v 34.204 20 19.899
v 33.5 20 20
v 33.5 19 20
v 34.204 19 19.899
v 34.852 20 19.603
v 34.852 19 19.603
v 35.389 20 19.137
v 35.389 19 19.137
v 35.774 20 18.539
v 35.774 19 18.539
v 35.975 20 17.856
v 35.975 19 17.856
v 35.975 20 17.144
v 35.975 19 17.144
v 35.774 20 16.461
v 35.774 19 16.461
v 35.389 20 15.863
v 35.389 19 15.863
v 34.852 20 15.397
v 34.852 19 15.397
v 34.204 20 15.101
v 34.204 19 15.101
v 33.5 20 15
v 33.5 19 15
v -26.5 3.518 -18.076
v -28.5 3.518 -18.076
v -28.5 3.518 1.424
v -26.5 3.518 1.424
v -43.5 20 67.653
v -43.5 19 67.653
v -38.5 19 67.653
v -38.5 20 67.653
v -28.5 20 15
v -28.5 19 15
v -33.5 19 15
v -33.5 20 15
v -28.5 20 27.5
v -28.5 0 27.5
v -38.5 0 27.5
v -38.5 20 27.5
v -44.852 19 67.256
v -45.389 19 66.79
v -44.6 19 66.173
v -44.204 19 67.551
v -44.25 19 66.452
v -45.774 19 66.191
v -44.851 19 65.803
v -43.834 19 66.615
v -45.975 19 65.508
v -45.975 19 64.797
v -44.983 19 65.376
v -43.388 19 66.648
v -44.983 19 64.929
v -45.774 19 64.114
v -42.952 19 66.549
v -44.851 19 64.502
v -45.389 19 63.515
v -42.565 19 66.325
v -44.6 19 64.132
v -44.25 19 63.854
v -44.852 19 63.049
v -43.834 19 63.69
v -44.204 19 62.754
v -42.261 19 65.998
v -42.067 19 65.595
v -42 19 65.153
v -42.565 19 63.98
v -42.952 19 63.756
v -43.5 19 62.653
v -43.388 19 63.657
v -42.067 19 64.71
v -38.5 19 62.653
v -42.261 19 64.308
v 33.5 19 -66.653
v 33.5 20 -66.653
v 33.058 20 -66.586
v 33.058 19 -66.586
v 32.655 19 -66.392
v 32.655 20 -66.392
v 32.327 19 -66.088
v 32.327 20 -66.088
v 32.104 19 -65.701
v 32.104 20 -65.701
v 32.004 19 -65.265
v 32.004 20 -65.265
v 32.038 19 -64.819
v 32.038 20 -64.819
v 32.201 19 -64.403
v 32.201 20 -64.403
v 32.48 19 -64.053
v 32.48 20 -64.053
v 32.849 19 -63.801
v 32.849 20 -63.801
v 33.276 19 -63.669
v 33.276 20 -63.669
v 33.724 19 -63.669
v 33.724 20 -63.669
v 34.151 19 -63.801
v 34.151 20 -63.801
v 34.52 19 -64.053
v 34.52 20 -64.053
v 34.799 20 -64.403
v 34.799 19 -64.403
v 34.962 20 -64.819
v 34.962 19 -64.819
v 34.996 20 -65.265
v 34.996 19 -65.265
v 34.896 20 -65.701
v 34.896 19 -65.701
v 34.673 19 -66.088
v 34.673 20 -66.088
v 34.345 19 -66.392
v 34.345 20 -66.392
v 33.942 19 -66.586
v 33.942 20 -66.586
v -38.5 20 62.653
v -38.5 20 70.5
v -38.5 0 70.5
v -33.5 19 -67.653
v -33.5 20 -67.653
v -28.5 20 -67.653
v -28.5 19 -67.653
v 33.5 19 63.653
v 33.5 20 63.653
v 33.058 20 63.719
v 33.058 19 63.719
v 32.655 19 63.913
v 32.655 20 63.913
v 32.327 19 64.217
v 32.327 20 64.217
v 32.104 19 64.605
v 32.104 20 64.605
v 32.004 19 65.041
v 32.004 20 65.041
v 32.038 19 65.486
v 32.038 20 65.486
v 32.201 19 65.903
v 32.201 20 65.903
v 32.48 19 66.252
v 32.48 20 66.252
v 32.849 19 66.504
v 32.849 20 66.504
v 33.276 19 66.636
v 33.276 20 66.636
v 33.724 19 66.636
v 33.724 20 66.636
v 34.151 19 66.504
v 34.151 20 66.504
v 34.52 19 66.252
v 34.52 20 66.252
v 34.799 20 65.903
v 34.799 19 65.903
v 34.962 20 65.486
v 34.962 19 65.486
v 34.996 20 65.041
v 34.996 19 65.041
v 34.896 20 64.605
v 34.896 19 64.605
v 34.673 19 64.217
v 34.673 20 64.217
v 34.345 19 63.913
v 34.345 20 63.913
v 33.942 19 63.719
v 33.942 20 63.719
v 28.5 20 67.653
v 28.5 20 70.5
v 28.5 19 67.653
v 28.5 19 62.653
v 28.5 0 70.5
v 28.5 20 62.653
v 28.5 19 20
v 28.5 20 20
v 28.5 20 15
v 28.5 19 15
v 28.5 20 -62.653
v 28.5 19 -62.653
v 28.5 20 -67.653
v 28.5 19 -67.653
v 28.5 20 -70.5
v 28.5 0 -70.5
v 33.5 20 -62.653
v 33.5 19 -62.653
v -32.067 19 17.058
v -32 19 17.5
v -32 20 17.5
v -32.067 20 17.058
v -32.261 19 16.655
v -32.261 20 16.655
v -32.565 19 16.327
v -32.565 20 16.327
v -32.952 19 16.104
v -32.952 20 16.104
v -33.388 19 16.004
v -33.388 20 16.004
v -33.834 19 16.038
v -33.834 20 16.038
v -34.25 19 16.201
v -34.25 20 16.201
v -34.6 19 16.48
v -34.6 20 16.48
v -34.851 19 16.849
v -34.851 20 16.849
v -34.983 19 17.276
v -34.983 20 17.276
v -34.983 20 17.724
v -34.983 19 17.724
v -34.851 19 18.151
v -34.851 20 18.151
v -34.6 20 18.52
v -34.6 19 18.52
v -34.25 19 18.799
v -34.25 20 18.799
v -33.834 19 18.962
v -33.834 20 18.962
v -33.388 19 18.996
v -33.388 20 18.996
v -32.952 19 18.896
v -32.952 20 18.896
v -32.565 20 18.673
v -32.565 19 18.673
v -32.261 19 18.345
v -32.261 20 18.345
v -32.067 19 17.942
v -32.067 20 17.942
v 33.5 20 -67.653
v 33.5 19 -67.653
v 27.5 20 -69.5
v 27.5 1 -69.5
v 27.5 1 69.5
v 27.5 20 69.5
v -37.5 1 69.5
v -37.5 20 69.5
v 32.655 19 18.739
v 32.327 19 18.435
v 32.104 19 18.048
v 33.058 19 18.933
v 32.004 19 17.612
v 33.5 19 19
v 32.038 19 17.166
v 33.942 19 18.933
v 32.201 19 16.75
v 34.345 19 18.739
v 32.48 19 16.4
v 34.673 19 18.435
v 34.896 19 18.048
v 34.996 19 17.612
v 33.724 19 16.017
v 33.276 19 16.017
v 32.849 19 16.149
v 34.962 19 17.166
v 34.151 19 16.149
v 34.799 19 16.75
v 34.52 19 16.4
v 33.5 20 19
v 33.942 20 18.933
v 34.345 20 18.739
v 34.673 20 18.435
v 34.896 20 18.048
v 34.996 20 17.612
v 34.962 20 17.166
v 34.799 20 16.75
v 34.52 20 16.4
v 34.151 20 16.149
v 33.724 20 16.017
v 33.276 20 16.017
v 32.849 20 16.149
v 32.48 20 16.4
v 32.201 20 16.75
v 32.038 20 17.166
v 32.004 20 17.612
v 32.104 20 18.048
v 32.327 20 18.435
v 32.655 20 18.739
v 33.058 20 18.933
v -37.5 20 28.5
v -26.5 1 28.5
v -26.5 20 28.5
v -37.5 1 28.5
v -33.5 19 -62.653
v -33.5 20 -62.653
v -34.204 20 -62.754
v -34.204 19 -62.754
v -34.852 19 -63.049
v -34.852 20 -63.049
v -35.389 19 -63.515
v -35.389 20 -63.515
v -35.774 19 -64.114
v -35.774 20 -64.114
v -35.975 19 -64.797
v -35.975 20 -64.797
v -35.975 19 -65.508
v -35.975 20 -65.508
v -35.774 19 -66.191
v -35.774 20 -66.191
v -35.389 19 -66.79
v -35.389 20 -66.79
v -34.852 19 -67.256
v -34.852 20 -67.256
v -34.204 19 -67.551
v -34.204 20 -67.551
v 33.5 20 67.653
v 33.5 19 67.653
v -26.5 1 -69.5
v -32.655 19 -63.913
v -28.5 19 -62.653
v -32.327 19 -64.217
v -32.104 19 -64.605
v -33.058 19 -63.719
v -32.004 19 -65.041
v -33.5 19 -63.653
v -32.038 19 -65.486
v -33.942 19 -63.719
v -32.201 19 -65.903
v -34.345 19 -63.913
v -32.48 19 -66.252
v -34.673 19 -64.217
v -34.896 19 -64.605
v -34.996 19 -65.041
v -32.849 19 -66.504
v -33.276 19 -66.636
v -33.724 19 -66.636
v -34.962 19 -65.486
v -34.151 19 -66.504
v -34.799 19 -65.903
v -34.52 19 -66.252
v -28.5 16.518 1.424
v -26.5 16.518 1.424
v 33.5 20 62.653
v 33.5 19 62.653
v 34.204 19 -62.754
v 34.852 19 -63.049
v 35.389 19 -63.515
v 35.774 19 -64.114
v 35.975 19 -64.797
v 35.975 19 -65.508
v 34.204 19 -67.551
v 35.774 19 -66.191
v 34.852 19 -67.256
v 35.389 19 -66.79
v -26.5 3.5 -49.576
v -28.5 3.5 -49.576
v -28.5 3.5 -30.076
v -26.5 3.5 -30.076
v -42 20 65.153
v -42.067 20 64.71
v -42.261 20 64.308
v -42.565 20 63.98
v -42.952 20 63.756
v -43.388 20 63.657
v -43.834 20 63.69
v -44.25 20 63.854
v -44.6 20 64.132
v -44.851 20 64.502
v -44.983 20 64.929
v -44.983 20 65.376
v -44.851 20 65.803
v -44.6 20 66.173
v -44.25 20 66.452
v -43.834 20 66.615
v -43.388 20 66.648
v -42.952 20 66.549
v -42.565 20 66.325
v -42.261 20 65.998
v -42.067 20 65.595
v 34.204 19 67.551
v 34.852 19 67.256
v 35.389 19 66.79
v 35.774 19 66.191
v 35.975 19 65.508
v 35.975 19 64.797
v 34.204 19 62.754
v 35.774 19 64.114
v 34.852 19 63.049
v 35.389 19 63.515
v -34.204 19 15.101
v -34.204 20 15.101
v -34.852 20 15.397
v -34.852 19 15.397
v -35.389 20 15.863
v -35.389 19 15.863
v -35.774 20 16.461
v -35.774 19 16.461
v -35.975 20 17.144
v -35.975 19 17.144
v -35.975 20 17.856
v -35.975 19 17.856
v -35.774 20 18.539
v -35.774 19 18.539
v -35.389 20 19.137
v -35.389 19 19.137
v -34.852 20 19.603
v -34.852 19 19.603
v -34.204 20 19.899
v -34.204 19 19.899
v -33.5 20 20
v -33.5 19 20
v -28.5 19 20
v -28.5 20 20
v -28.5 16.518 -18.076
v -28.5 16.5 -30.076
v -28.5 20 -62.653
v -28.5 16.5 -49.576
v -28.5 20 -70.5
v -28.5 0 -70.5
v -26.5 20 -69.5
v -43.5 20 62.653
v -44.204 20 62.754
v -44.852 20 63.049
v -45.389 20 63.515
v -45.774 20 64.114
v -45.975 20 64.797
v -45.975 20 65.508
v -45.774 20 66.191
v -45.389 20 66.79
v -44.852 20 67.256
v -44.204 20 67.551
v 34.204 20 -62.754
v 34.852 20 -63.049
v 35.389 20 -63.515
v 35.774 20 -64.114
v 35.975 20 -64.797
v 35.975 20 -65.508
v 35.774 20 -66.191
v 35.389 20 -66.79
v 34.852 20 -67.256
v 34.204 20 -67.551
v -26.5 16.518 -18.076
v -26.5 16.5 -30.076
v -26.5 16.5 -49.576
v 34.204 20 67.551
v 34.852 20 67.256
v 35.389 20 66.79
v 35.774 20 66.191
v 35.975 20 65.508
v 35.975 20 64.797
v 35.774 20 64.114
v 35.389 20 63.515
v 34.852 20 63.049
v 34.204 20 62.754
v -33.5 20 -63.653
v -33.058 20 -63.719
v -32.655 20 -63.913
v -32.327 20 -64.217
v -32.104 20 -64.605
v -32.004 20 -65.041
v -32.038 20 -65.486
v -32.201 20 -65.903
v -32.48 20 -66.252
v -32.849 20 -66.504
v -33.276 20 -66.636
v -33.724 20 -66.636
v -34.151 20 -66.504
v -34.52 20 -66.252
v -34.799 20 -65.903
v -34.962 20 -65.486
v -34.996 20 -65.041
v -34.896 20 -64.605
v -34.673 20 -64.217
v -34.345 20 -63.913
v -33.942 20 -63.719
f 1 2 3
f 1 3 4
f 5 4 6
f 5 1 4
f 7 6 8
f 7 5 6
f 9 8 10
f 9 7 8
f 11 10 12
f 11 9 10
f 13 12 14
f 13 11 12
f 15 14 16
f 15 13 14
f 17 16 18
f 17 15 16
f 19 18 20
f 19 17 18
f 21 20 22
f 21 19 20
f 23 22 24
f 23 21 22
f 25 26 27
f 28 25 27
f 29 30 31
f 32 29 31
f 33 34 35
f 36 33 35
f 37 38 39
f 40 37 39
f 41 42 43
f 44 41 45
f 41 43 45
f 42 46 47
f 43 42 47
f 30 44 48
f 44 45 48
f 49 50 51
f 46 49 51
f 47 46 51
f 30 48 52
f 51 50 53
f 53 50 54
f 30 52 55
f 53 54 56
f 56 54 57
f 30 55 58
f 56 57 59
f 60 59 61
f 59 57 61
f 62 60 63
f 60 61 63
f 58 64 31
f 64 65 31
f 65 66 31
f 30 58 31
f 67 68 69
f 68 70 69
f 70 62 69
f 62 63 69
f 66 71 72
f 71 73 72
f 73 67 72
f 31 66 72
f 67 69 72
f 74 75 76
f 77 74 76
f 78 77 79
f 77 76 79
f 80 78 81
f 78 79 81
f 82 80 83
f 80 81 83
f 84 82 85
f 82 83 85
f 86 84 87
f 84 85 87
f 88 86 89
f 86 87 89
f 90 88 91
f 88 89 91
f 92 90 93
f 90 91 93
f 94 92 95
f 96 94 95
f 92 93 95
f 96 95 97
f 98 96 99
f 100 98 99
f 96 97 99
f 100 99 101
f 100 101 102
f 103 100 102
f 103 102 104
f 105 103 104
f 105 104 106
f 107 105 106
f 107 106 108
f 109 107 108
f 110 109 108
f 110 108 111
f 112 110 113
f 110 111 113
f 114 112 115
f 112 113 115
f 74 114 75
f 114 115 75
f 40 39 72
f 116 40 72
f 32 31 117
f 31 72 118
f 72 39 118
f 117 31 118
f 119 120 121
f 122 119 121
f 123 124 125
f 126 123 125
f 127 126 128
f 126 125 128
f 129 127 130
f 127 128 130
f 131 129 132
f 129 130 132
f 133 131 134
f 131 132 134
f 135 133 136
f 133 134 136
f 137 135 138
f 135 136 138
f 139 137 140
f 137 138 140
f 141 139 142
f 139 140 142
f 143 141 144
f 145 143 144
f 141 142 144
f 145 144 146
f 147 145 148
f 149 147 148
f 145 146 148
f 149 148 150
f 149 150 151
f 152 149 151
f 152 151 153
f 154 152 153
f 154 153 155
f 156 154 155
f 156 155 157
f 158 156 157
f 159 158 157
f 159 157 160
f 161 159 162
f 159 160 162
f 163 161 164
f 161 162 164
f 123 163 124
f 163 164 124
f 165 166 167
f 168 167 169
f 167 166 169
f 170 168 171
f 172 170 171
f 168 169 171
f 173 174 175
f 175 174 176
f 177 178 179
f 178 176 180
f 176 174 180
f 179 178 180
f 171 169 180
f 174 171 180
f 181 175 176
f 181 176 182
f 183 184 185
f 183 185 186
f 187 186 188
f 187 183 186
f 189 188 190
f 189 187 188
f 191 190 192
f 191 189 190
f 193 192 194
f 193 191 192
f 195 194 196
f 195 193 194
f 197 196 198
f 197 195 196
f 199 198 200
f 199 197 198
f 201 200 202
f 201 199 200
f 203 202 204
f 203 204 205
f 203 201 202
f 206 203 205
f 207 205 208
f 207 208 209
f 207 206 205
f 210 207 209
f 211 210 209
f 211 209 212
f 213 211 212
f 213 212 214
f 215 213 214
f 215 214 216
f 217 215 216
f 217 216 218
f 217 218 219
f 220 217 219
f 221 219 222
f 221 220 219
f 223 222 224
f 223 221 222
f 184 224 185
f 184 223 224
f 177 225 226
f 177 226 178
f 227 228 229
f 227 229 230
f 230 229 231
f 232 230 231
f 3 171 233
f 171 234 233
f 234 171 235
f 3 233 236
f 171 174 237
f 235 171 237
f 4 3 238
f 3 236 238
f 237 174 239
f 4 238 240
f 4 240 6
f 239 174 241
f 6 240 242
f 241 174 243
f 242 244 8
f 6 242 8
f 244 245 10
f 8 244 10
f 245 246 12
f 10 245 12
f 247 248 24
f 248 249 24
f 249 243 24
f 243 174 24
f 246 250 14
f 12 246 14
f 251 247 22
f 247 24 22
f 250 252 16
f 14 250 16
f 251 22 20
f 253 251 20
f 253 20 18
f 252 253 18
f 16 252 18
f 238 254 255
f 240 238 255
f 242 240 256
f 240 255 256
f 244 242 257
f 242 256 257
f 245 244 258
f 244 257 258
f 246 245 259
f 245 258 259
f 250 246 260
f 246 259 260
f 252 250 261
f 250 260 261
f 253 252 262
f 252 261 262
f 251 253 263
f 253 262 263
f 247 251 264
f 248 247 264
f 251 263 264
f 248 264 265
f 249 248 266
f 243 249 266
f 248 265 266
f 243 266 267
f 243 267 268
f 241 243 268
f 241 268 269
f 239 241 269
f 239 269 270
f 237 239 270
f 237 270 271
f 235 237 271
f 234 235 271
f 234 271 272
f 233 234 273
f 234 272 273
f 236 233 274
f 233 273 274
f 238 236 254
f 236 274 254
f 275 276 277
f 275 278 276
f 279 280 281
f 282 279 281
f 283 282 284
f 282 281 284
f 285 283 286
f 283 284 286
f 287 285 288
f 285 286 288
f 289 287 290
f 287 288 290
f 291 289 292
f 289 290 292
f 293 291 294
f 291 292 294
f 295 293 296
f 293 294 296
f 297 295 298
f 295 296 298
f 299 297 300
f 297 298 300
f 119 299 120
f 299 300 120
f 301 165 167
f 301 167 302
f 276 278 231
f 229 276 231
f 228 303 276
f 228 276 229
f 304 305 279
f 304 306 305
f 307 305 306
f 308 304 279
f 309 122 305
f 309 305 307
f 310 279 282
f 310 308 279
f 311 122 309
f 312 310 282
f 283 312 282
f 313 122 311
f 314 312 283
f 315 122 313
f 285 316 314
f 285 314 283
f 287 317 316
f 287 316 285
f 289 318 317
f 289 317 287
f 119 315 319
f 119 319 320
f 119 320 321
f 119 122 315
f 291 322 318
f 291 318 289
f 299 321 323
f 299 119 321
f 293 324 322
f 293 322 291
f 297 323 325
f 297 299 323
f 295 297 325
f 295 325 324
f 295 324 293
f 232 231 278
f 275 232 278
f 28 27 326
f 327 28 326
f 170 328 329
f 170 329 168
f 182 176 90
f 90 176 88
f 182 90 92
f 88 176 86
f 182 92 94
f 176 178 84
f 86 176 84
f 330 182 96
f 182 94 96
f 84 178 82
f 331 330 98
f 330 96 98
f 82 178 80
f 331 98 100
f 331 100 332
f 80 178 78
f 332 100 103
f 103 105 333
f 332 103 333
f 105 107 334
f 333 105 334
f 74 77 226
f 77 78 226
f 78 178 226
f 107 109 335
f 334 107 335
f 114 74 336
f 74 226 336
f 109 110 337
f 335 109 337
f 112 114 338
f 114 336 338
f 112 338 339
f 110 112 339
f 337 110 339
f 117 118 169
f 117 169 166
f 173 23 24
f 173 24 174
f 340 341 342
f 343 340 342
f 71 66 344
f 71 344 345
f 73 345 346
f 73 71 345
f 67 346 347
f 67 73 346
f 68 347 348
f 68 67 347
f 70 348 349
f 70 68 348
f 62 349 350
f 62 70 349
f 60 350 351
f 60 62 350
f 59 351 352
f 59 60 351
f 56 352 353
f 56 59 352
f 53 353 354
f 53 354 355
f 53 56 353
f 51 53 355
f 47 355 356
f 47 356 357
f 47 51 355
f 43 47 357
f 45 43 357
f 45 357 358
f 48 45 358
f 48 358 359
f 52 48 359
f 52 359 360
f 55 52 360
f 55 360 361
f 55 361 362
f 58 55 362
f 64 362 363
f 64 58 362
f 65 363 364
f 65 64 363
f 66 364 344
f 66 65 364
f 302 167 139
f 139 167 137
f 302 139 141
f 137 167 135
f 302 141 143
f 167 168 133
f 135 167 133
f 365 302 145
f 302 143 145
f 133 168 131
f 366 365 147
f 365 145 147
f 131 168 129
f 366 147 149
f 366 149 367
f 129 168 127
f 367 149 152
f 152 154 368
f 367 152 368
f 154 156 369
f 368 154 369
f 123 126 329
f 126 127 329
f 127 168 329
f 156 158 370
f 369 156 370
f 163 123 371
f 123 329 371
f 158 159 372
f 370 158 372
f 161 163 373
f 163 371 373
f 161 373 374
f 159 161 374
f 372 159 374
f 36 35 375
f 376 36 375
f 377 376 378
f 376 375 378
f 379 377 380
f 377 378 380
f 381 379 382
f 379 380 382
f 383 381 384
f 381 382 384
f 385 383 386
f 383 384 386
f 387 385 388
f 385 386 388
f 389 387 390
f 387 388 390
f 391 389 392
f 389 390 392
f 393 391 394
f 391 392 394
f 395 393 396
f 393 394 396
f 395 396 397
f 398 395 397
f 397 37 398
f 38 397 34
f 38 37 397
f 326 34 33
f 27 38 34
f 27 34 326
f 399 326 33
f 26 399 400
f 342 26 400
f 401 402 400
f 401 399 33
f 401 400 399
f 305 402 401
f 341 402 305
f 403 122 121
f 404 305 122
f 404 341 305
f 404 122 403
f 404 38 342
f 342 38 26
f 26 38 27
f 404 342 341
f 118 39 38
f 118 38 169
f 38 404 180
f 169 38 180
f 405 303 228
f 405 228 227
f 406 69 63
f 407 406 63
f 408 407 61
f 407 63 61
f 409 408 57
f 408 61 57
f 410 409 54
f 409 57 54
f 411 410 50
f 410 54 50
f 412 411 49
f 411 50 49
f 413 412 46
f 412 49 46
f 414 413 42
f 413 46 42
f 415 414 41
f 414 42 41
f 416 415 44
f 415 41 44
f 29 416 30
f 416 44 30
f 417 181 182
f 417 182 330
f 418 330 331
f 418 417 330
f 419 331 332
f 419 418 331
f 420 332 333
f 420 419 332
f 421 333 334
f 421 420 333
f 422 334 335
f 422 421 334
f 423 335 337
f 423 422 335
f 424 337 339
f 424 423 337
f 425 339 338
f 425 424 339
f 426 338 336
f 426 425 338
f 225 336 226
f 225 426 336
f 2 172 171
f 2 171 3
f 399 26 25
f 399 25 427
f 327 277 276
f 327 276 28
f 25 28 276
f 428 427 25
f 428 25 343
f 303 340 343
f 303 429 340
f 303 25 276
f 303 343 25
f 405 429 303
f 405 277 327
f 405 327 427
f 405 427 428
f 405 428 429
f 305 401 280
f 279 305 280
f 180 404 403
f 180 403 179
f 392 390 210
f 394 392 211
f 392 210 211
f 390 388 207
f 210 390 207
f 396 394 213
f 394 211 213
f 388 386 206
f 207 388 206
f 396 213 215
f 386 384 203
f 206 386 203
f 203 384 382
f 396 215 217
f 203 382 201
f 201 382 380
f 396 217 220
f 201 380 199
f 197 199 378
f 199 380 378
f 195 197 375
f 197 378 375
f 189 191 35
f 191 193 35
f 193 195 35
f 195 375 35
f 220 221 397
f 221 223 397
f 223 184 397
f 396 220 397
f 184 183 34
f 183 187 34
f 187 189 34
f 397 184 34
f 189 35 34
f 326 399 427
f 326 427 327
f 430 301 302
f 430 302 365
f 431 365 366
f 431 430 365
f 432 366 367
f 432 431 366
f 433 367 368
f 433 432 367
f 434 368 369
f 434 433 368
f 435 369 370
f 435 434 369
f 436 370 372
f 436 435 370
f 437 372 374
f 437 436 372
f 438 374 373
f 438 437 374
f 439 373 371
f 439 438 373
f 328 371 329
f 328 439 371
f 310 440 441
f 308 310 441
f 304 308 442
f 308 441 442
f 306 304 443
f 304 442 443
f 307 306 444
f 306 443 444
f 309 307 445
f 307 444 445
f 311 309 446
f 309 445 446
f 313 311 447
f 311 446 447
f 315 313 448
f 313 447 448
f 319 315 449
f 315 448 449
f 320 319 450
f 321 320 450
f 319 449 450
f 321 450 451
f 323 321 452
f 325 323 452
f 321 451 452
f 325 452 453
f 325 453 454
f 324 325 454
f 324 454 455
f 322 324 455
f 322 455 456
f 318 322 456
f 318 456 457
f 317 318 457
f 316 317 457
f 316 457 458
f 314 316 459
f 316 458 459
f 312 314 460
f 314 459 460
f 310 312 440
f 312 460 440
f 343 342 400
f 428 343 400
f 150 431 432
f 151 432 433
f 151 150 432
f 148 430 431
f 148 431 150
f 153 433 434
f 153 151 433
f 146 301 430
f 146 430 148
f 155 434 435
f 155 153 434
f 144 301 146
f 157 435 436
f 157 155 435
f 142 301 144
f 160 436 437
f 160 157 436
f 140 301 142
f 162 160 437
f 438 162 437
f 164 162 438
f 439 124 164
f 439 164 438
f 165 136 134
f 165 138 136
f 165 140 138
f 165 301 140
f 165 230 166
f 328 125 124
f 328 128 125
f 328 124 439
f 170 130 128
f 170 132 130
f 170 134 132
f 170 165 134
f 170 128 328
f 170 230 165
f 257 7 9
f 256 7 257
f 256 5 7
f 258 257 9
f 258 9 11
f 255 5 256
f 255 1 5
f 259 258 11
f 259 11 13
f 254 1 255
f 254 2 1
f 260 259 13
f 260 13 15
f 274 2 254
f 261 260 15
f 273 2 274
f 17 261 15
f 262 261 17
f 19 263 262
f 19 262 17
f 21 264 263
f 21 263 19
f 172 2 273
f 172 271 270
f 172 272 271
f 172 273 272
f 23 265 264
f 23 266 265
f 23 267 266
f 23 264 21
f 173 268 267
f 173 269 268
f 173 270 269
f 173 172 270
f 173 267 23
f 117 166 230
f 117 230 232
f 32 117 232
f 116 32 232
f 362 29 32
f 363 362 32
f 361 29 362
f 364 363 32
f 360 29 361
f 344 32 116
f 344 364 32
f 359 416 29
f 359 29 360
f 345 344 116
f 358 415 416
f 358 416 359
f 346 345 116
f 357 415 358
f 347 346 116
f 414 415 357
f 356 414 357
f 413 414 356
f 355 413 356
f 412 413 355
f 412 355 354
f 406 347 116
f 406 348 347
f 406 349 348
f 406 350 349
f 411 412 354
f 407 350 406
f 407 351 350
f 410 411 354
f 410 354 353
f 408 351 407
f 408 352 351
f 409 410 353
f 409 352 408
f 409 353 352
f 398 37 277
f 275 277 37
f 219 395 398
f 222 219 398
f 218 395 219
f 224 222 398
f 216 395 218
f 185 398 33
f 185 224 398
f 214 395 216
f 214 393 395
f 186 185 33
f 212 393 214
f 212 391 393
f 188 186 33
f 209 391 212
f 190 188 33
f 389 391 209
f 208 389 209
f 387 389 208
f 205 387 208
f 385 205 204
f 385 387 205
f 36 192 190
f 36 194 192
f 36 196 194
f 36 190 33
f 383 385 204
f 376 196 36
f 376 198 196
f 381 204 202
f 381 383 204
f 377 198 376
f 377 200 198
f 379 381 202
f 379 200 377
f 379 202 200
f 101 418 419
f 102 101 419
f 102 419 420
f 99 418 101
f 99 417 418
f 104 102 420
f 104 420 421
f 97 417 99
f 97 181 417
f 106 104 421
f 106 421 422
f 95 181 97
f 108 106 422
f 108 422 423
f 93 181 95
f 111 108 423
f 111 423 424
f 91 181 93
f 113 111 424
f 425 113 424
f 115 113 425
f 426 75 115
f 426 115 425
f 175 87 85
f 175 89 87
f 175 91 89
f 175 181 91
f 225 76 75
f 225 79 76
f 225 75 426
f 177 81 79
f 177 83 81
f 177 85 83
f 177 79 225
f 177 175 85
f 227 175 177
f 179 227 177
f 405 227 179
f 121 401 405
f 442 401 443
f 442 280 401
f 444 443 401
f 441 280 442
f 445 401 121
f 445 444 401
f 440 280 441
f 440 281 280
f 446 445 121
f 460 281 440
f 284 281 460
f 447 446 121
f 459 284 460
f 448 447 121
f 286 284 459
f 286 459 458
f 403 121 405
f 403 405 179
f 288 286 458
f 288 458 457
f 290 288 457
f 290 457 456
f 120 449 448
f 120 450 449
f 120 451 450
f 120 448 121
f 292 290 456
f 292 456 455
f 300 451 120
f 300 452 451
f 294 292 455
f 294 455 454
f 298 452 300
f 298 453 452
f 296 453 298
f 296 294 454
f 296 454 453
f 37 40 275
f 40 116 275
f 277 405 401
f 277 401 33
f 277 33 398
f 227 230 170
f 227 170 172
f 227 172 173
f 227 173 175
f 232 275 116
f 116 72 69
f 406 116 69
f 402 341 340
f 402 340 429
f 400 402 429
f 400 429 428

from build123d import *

# Parameters (mm, degrees)
SKETCH2_W               = 57
SKETCH2_H               = 141
BOSS_EXTRUDE1_DEPTH     = 20
SKETCH3_R               = 1.5
BOSS_EXTRUDE3_DEPTH     = 1
BOSS_EXTRUDE3_2_DEPTH   = 1
BOSS_EXTRUDE3_3_DEPTH   = 1
SKETCH4_W               = 43
SKETCH4_H               = 20
BOSS_EXTRUDE4_DEPTH     = 10
MIRROR1_START           = 19
MIRROR1_OUTLINE_R       = 1.5
MIRROR1_DEPTH           = 1
SHELL3_START            = -27.5
SHELL3_OUTLINE_W        = 19
SHELL3_OUTLINE_H        = 139
SHELL3_DEPTH            = 55
SHELL3_START_2          = 27.5
SHELL3_2_OUTLINE_W      = 19
SHELL3_2_OUTLINE_H      = 41
SHELL3_2_DEPTH          = 10
SKETCH10_R              = 1.5
BOSS_EXTRUDE5_DEPTH     = 1
MIRROR2_OUTLINE_W       = 1
MIRROR2_OUTLINE_H       = 41
MIRROR2_DEPTH           = 20
MIRROR2_2_DEPTH         = 1
MIRROR2_START           = 19
MIRROR2_3_OUTLINE_R     = 1.5
MIRROR2_3_DEPTH         = 1
SKETCH17_W              = 98
SKETCH17_H              = 20
BOSS_EXTRUDE7_DEPTH     = 2
CUT_EXTRUDE1_DEPTH      = 87.297450716
CUT_EXTRUDE1_DEPTH_BACK = 87.297450716
SKETCH11_W              = 45.81490068
SKETCH11_H              = 58.670112651
SKETCH13_W              = 18.731668524
SKETCH13_H              = 41
CUT_EXTRUDE15_DEPTH     = 87.297450716
SKETCH14_W              = 19.5
SKETCH14_H              = 13
CUT_EXTRUDE16_DEPTH     = 2
SKETCH15_R              = 1.5
BOSS_EXTRUDE6_DEPTH     = 1
SKETCH18_W              = 1
SKETCH18_H              = 19
BOSS_EXTRUDE8_DEPTH     = 1


# Read off the part's stored shape, not the designer's step: Mirror1, Shell3, Mirror2
with BuildPart() as part:
    # Sketch2 → Boss-Extrude1 (new body)
    with BuildSketch(Plane(origin=(0, 0, 0), x_dir=(1, 0, 0), z_dir=(0, 1, 0))):
        Rectangle(SKETCH2_W, SKETCH2_H)
    extrude(amount=BOSS_EXTRUDE1_DEPTH)

    # Sketch4 → Boss-Extrude4 (add)
    with BuildSketch(Plane(origin=(28.5, 0, 0), x_dir=(0, 0, -1), z_dir=(1, 0, 0))):
        with Locations((-49, 10)):
            Rectangle(SKETCH4_W, SKETCH4_H)
    extrude(amount=BOSS_EXTRUDE4_DEPTH)

    # Mirror1 outline → Mirror1 (add)
    with BuildSketch(Plane(origin=(0, 0, 0), x_dir=(1, 0, 0), z_dir=(0, 1, 0)).offset(MIRROR1_START)):
        with BuildLine():
            ThreePointArc((43.5, -67.652604127), (46, -65.152604127), (43.5, -62.652604127))
            Line((43.5, -62.652604127), (38.5, -62.652604127))
            Line((38.5, -62.652604127), (38.5, -67.652604127))
            Line((38.5, -67.652604127), (43.5, -67.652604127))
        make_face()
        with Locations((43.5, -65.152604127)):
            Circle(MIRROR1_OUTLINE_R, mode=Mode.SUBTRACT)
    extrude(amount=MIRROR1_DEPTH)

    # Shell3 outline → Shell3 (cut)
    with BuildSketch(Plane.YZ.offset(SHELL3_START)):
        with Locations((10.5, 0)):
            Rectangle(SHELL3_OUTLINE_W, SHELL3_OUTLINE_H)
    extrude(amount=SHELL3_DEPTH, mode=Mode.SUBTRACT)

    # Shell3 2 outline → Shell3 2 (cut)
    with BuildSketch(Plane.YZ.offset(SHELL3_START_2)):
        with Locations((10.5, 49)):
            Rectangle(SHELL3_2_OUTLINE_W, SHELL3_2_OUTLINE_H)
    extrude(amount=SHELL3_2_DEPTH, mode=Mode.SUBTRACT)

    # Sketch10 → Boss-Extrude5 (add)
    with BuildSketch(Plane(origin=(0, 20, 0), x_dir=(1, 0, 0), z_dir=(0, 1, 0))):
        with BuildLine():
            Line((33.5, -15), (28.5, -15))
            Line((28.5, -15), (28.5, -20))
            Line((28.5, -20), (33.5, -20))
            ThreePointArc((33.5, -20), (36, -17.5), (33.5, -15))
        make_face()
        with Locations(Location((33.5, -17.5, 0), (0, 0, 270))):
            Circle(SKETCH10_R, mode=Mode.SUBTRACT)
    extrude(amount=-BOSS_EXTRUDE5_DEPTH)


with BuildPart() as body_2:
    # Sketch3 → Boss-Extrude3 (new body)
    with BuildSketch(Plane(origin=(0, 20, 0), x_dir=(1, 0, 0), z_dir=(0, 1, 0))):
        with BuildLine():
            Line((-33.5, 67.652604127), (-28.5, 67.652604127))
            Line((-28.5, 67.652604127), (-28.5, 62.652604127))
            Line((-28.5, 62.652604127), (-33.5, 62.652604127))
            ThreePointArc((-33.5, 62.652604127), (-36, 65.152604127), (-33.5, 67.652604127))
        make_face()
        with Locations(Location((-33.5, 65.152604127, 0), (0, 0, 270))):
            Circle(SKETCH3_R, mode=Mode.SUBTRACT)
    extrude(amount=-BOSS_EXTRUDE3_DEPTH)



with BuildPart() as body_3:
    # Sketch3 → Boss-Extrude3 2 (new body)
    with BuildSketch(Plane(origin=(0, 20, 0), x_dir=(1, 0, 0), z_dir=(0, 1, 0))):
        with BuildLine():
            Line((-28.5, -67.652604127), (-28.5, -62.652604127))
            Line((-28.5, -62.652604127), (-33.5, -62.652604127))
            ThreePointArc((-33.5, -62.652604127), (-36, -65.152604127), (-33.5, -67.652604127))
            Line((-33.5, -67.652604127), (-28.5, -67.652604127))
        make_face()
        with Locations(Location((-33.5, -65.152604127, 0), (0, 0, 90))):
            Circle(SKETCH3_R, mode=Mode.SUBTRACT)
    extrude(amount=-BOSS_EXTRUDE3_2_DEPTH)


with BuildPart() as body_4:
    # Sketch3 → Boss-Extrude3 3 (new body)
    with BuildSketch(Plane(origin=(0, 20, 0), x_dir=(1, 0, 0), z_dir=(0, 1, 0))):
        with BuildLine():
            Line((28.5, 67.652604127), (28.5, 62.652604127))
            Line((28.5, 62.652604127), (33.5, 62.652604127))
            ThreePointArc((33.5, 62.652604127), (36, 65.152604127), (33.5, 67.652604127))
            Line((33.5, 67.652604127), (28.5, 67.652604127))
        make_face()
        with Locations(Location((33.5, 65.152604127, 0), (0, 0, 90))):
            Circle(SKETCH3_R, mode=Mode.SUBTRACT)
    extrude(amount=-BOSS_EXTRUDE3_3_DEPTH)


with BuildPart() as body_2_1:
    add(body_2.part)

    add(body_4.part)  # Mirror2 merges body 4

    add(part.part)  # Mirror2 merges part
    # Mirror2 outline → Mirror2 (add)
    with BuildSketch(Plane(origin=(0, 0, 0), x_dir=(1, 0, 0), z_dir=(0, 1, 0))):
        with Locations((28, -49)):
            Rectangle(MIRROR2_OUTLINE_W, MIRROR2_OUTLINE_H)
        Polygon((-28.5, -70.5), (-28.5, -69.5), (-37.5, -69.5), (-37.5, -28.5), (-28.5, -28.5), (-28.5, -27.5), (-38.5, -27.5), (-38.5, -70.5), align=None)
    extrude(amount=MIRROR2_DEPTH)

    # Mirror2 2 outline → Mirror2 2 (add)
    with BuildSketch(Plane(origin=(0, 0, 0), x_dir=(1, 0, 0), z_dir=(0, 1, 0))):
        Polygon((-37.5, -69.5), (-28.5, -69.5), (-28.5, -67.652604127), (-28.5, -62.652604127), (-28.5, -28.5), (-37.5, -28.5), align=None)
    extrude(amount=MIRROR2_2_DEPTH)

    # Mirror2 3 outline → Mirror2 3 (add)
    # profile 1 of 2: a face of its own
    with BuildSketch(Plane(origin=(0, 0, 0), x_dir=(1, 0, 0), z_dir=(0, 1, 0)).offset(MIRROR2_START)):
        with BuildLine():
            Line((-33.5, -20), (-28.5, -20))
            Line((-28.5, -20), (-28.5, -15))
            Line((-28.5, -15), (-33.5, -15))
            ThreePointArc((-33.5, -15), (-36, -17.5), (-33.5, -20))
        make_face()
        with Locations((-33.5, -17.5)):
            Circle(MIRROR2_3_OUTLINE_R, mode=Mode.SUBTRACT)
    # profile 2 of 2: a face of its own
    with BuildSketch(Plane(origin=(0, 0, 0), x_dir=(1, 0, 0), z_dir=(0, 1, 0)).offset(MIRROR2_START)):
        with BuildLine():
            Line((-43.5, -67.652604127), (-38.5, -67.652604127))
            Line((-38.5, -67.652604127), (-38.5, -62.652604127))
            Line((-38.5, -62.652604127), (-43.5, -62.652604127))
            ThreePointArc((-43.5, -62.652604127), (-46, -65.152604127), (-43.5, -67.652604127))
        make_face()
        with Locations((-43.5, -65.152604127)):
            Circle(MIRROR2_3_OUTLINE_R, mode=Mode.SUBTRACT)
    extrude(amount=MIRROR2_3_DEPTH)

    # Sketch17 → Boss-Extrude7 (add)
    with BuildSketch(Plane.ZY.offset(28.5)):
        with Locations((-21.5, 10)):
            Rectangle(SKETCH17_W, SKETCH17_H)
    extrude(amount=-BOSS_EXTRUDE7_DEPTH)

    # Sketch11 → Cut-Extrude1 (cut, two sides: drawn at the far end of the back side and taken through both)
    with BuildSketch(Plane(origin=(0, 1, 0), x_dir=(1, 0, 0), z_dir=(0, 1, 0)).offset(-CUT_EXTRUDE1_DEPTH_BACK)):
        with Locations((51.40745034, -56.835056326)):
            Rectangle(SKETCH11_W, SKETCH11_H)
    extrude(amount=CUT_EXTRUDE1_DEPTH + CUT_EXTRUDE1_DEPTH_BACK, mode=Mode.SUBTRACT)


with BuildPart() as cut_extrude15_tool:
    # Sketch13 → Cut-Extrude15 (new, through all)
    with BuildSketch(Plane(origin=(0, 1, 0), x_dir=(1, 0, 0), z_dir=(0, 1, 0))):
        with Locations((-28.134165738, -49)):
            Rectangle(SKETCH13_W, SKETCH13_H)
    extrude(amount=CUT_EXTRUDE15_DEPTH)


with BuildPart() as body_2_2:
    add(body_2_1.part)

    # Cut-Extrude15: cut by cut_extrude15_tool
    add(cut_extrude15_tool.part, mode=Mode.SUBTRACT)

    # Sketch14 → Cut-Extrude16 (cut)
    with BuildSketch(Plane.ZY.offset(28.5)):
        with Locations((-39.826302064, 10)):
            Rectangle(SKETCH14_W, SKETCH14_H)
        with Locations((-8.326302064, 10.017547542)):
            Rectangle(SKETCH14_W, SKETCH14_H)
    extrude(amount=-CUT_EXTRUDE16_DEPTH, mode=Mode.SUBTRACT)

    # Sketch15 → Boss-Extrude6 (add)
    with BuildSketch(Plane(origin=(0, 20, 0), x_dir=(1, 0, 0), z_dir=(0, 1, 0))):
        with BuildLine():
            Line((28.5, -67.652604127), (33.5, -67.652604127))
            ThreePointArc((33.5, -67.652604127), (36, -65.152604127), (33.5, -62.652604127))
            Line((33.5, -62.652604127), (28.5, -62.652604127))
            Line((28.5, -62.652604127), (28.5, -67.652604127))
        make_face()
        with Locations(Location((33.5, -65.152604127, 0), (0, 0, 90))):
            Circle(SKETCH15_R, mode=Mode.SUBTRACT)
    extrude(amount=-BOSS_EXTRUDE6_DEPTH)

    # Sketch18 → Boss-Extrude8 (add)
    with BuildSketch(Plane(origin=(-27.5, 0, 0), x_dir=(0, 0, -1), z_dir=(1, 0, 0))):
        with Locations((-28, 10.5)):
            Rectangle(SKETCH18_W, SKETCH18_H)
    extrude(amount=BOSS_EXTRUDE8_DEPTH)


with BuildPart() as body_3_1:
    add(body_3.part)

    # Cut-Extrude15: cut by cut_extrude15_tool
    add(cut_extrude15_tool.part, mode=Mode.SUBTRACT)


solid = body_2_2.part
